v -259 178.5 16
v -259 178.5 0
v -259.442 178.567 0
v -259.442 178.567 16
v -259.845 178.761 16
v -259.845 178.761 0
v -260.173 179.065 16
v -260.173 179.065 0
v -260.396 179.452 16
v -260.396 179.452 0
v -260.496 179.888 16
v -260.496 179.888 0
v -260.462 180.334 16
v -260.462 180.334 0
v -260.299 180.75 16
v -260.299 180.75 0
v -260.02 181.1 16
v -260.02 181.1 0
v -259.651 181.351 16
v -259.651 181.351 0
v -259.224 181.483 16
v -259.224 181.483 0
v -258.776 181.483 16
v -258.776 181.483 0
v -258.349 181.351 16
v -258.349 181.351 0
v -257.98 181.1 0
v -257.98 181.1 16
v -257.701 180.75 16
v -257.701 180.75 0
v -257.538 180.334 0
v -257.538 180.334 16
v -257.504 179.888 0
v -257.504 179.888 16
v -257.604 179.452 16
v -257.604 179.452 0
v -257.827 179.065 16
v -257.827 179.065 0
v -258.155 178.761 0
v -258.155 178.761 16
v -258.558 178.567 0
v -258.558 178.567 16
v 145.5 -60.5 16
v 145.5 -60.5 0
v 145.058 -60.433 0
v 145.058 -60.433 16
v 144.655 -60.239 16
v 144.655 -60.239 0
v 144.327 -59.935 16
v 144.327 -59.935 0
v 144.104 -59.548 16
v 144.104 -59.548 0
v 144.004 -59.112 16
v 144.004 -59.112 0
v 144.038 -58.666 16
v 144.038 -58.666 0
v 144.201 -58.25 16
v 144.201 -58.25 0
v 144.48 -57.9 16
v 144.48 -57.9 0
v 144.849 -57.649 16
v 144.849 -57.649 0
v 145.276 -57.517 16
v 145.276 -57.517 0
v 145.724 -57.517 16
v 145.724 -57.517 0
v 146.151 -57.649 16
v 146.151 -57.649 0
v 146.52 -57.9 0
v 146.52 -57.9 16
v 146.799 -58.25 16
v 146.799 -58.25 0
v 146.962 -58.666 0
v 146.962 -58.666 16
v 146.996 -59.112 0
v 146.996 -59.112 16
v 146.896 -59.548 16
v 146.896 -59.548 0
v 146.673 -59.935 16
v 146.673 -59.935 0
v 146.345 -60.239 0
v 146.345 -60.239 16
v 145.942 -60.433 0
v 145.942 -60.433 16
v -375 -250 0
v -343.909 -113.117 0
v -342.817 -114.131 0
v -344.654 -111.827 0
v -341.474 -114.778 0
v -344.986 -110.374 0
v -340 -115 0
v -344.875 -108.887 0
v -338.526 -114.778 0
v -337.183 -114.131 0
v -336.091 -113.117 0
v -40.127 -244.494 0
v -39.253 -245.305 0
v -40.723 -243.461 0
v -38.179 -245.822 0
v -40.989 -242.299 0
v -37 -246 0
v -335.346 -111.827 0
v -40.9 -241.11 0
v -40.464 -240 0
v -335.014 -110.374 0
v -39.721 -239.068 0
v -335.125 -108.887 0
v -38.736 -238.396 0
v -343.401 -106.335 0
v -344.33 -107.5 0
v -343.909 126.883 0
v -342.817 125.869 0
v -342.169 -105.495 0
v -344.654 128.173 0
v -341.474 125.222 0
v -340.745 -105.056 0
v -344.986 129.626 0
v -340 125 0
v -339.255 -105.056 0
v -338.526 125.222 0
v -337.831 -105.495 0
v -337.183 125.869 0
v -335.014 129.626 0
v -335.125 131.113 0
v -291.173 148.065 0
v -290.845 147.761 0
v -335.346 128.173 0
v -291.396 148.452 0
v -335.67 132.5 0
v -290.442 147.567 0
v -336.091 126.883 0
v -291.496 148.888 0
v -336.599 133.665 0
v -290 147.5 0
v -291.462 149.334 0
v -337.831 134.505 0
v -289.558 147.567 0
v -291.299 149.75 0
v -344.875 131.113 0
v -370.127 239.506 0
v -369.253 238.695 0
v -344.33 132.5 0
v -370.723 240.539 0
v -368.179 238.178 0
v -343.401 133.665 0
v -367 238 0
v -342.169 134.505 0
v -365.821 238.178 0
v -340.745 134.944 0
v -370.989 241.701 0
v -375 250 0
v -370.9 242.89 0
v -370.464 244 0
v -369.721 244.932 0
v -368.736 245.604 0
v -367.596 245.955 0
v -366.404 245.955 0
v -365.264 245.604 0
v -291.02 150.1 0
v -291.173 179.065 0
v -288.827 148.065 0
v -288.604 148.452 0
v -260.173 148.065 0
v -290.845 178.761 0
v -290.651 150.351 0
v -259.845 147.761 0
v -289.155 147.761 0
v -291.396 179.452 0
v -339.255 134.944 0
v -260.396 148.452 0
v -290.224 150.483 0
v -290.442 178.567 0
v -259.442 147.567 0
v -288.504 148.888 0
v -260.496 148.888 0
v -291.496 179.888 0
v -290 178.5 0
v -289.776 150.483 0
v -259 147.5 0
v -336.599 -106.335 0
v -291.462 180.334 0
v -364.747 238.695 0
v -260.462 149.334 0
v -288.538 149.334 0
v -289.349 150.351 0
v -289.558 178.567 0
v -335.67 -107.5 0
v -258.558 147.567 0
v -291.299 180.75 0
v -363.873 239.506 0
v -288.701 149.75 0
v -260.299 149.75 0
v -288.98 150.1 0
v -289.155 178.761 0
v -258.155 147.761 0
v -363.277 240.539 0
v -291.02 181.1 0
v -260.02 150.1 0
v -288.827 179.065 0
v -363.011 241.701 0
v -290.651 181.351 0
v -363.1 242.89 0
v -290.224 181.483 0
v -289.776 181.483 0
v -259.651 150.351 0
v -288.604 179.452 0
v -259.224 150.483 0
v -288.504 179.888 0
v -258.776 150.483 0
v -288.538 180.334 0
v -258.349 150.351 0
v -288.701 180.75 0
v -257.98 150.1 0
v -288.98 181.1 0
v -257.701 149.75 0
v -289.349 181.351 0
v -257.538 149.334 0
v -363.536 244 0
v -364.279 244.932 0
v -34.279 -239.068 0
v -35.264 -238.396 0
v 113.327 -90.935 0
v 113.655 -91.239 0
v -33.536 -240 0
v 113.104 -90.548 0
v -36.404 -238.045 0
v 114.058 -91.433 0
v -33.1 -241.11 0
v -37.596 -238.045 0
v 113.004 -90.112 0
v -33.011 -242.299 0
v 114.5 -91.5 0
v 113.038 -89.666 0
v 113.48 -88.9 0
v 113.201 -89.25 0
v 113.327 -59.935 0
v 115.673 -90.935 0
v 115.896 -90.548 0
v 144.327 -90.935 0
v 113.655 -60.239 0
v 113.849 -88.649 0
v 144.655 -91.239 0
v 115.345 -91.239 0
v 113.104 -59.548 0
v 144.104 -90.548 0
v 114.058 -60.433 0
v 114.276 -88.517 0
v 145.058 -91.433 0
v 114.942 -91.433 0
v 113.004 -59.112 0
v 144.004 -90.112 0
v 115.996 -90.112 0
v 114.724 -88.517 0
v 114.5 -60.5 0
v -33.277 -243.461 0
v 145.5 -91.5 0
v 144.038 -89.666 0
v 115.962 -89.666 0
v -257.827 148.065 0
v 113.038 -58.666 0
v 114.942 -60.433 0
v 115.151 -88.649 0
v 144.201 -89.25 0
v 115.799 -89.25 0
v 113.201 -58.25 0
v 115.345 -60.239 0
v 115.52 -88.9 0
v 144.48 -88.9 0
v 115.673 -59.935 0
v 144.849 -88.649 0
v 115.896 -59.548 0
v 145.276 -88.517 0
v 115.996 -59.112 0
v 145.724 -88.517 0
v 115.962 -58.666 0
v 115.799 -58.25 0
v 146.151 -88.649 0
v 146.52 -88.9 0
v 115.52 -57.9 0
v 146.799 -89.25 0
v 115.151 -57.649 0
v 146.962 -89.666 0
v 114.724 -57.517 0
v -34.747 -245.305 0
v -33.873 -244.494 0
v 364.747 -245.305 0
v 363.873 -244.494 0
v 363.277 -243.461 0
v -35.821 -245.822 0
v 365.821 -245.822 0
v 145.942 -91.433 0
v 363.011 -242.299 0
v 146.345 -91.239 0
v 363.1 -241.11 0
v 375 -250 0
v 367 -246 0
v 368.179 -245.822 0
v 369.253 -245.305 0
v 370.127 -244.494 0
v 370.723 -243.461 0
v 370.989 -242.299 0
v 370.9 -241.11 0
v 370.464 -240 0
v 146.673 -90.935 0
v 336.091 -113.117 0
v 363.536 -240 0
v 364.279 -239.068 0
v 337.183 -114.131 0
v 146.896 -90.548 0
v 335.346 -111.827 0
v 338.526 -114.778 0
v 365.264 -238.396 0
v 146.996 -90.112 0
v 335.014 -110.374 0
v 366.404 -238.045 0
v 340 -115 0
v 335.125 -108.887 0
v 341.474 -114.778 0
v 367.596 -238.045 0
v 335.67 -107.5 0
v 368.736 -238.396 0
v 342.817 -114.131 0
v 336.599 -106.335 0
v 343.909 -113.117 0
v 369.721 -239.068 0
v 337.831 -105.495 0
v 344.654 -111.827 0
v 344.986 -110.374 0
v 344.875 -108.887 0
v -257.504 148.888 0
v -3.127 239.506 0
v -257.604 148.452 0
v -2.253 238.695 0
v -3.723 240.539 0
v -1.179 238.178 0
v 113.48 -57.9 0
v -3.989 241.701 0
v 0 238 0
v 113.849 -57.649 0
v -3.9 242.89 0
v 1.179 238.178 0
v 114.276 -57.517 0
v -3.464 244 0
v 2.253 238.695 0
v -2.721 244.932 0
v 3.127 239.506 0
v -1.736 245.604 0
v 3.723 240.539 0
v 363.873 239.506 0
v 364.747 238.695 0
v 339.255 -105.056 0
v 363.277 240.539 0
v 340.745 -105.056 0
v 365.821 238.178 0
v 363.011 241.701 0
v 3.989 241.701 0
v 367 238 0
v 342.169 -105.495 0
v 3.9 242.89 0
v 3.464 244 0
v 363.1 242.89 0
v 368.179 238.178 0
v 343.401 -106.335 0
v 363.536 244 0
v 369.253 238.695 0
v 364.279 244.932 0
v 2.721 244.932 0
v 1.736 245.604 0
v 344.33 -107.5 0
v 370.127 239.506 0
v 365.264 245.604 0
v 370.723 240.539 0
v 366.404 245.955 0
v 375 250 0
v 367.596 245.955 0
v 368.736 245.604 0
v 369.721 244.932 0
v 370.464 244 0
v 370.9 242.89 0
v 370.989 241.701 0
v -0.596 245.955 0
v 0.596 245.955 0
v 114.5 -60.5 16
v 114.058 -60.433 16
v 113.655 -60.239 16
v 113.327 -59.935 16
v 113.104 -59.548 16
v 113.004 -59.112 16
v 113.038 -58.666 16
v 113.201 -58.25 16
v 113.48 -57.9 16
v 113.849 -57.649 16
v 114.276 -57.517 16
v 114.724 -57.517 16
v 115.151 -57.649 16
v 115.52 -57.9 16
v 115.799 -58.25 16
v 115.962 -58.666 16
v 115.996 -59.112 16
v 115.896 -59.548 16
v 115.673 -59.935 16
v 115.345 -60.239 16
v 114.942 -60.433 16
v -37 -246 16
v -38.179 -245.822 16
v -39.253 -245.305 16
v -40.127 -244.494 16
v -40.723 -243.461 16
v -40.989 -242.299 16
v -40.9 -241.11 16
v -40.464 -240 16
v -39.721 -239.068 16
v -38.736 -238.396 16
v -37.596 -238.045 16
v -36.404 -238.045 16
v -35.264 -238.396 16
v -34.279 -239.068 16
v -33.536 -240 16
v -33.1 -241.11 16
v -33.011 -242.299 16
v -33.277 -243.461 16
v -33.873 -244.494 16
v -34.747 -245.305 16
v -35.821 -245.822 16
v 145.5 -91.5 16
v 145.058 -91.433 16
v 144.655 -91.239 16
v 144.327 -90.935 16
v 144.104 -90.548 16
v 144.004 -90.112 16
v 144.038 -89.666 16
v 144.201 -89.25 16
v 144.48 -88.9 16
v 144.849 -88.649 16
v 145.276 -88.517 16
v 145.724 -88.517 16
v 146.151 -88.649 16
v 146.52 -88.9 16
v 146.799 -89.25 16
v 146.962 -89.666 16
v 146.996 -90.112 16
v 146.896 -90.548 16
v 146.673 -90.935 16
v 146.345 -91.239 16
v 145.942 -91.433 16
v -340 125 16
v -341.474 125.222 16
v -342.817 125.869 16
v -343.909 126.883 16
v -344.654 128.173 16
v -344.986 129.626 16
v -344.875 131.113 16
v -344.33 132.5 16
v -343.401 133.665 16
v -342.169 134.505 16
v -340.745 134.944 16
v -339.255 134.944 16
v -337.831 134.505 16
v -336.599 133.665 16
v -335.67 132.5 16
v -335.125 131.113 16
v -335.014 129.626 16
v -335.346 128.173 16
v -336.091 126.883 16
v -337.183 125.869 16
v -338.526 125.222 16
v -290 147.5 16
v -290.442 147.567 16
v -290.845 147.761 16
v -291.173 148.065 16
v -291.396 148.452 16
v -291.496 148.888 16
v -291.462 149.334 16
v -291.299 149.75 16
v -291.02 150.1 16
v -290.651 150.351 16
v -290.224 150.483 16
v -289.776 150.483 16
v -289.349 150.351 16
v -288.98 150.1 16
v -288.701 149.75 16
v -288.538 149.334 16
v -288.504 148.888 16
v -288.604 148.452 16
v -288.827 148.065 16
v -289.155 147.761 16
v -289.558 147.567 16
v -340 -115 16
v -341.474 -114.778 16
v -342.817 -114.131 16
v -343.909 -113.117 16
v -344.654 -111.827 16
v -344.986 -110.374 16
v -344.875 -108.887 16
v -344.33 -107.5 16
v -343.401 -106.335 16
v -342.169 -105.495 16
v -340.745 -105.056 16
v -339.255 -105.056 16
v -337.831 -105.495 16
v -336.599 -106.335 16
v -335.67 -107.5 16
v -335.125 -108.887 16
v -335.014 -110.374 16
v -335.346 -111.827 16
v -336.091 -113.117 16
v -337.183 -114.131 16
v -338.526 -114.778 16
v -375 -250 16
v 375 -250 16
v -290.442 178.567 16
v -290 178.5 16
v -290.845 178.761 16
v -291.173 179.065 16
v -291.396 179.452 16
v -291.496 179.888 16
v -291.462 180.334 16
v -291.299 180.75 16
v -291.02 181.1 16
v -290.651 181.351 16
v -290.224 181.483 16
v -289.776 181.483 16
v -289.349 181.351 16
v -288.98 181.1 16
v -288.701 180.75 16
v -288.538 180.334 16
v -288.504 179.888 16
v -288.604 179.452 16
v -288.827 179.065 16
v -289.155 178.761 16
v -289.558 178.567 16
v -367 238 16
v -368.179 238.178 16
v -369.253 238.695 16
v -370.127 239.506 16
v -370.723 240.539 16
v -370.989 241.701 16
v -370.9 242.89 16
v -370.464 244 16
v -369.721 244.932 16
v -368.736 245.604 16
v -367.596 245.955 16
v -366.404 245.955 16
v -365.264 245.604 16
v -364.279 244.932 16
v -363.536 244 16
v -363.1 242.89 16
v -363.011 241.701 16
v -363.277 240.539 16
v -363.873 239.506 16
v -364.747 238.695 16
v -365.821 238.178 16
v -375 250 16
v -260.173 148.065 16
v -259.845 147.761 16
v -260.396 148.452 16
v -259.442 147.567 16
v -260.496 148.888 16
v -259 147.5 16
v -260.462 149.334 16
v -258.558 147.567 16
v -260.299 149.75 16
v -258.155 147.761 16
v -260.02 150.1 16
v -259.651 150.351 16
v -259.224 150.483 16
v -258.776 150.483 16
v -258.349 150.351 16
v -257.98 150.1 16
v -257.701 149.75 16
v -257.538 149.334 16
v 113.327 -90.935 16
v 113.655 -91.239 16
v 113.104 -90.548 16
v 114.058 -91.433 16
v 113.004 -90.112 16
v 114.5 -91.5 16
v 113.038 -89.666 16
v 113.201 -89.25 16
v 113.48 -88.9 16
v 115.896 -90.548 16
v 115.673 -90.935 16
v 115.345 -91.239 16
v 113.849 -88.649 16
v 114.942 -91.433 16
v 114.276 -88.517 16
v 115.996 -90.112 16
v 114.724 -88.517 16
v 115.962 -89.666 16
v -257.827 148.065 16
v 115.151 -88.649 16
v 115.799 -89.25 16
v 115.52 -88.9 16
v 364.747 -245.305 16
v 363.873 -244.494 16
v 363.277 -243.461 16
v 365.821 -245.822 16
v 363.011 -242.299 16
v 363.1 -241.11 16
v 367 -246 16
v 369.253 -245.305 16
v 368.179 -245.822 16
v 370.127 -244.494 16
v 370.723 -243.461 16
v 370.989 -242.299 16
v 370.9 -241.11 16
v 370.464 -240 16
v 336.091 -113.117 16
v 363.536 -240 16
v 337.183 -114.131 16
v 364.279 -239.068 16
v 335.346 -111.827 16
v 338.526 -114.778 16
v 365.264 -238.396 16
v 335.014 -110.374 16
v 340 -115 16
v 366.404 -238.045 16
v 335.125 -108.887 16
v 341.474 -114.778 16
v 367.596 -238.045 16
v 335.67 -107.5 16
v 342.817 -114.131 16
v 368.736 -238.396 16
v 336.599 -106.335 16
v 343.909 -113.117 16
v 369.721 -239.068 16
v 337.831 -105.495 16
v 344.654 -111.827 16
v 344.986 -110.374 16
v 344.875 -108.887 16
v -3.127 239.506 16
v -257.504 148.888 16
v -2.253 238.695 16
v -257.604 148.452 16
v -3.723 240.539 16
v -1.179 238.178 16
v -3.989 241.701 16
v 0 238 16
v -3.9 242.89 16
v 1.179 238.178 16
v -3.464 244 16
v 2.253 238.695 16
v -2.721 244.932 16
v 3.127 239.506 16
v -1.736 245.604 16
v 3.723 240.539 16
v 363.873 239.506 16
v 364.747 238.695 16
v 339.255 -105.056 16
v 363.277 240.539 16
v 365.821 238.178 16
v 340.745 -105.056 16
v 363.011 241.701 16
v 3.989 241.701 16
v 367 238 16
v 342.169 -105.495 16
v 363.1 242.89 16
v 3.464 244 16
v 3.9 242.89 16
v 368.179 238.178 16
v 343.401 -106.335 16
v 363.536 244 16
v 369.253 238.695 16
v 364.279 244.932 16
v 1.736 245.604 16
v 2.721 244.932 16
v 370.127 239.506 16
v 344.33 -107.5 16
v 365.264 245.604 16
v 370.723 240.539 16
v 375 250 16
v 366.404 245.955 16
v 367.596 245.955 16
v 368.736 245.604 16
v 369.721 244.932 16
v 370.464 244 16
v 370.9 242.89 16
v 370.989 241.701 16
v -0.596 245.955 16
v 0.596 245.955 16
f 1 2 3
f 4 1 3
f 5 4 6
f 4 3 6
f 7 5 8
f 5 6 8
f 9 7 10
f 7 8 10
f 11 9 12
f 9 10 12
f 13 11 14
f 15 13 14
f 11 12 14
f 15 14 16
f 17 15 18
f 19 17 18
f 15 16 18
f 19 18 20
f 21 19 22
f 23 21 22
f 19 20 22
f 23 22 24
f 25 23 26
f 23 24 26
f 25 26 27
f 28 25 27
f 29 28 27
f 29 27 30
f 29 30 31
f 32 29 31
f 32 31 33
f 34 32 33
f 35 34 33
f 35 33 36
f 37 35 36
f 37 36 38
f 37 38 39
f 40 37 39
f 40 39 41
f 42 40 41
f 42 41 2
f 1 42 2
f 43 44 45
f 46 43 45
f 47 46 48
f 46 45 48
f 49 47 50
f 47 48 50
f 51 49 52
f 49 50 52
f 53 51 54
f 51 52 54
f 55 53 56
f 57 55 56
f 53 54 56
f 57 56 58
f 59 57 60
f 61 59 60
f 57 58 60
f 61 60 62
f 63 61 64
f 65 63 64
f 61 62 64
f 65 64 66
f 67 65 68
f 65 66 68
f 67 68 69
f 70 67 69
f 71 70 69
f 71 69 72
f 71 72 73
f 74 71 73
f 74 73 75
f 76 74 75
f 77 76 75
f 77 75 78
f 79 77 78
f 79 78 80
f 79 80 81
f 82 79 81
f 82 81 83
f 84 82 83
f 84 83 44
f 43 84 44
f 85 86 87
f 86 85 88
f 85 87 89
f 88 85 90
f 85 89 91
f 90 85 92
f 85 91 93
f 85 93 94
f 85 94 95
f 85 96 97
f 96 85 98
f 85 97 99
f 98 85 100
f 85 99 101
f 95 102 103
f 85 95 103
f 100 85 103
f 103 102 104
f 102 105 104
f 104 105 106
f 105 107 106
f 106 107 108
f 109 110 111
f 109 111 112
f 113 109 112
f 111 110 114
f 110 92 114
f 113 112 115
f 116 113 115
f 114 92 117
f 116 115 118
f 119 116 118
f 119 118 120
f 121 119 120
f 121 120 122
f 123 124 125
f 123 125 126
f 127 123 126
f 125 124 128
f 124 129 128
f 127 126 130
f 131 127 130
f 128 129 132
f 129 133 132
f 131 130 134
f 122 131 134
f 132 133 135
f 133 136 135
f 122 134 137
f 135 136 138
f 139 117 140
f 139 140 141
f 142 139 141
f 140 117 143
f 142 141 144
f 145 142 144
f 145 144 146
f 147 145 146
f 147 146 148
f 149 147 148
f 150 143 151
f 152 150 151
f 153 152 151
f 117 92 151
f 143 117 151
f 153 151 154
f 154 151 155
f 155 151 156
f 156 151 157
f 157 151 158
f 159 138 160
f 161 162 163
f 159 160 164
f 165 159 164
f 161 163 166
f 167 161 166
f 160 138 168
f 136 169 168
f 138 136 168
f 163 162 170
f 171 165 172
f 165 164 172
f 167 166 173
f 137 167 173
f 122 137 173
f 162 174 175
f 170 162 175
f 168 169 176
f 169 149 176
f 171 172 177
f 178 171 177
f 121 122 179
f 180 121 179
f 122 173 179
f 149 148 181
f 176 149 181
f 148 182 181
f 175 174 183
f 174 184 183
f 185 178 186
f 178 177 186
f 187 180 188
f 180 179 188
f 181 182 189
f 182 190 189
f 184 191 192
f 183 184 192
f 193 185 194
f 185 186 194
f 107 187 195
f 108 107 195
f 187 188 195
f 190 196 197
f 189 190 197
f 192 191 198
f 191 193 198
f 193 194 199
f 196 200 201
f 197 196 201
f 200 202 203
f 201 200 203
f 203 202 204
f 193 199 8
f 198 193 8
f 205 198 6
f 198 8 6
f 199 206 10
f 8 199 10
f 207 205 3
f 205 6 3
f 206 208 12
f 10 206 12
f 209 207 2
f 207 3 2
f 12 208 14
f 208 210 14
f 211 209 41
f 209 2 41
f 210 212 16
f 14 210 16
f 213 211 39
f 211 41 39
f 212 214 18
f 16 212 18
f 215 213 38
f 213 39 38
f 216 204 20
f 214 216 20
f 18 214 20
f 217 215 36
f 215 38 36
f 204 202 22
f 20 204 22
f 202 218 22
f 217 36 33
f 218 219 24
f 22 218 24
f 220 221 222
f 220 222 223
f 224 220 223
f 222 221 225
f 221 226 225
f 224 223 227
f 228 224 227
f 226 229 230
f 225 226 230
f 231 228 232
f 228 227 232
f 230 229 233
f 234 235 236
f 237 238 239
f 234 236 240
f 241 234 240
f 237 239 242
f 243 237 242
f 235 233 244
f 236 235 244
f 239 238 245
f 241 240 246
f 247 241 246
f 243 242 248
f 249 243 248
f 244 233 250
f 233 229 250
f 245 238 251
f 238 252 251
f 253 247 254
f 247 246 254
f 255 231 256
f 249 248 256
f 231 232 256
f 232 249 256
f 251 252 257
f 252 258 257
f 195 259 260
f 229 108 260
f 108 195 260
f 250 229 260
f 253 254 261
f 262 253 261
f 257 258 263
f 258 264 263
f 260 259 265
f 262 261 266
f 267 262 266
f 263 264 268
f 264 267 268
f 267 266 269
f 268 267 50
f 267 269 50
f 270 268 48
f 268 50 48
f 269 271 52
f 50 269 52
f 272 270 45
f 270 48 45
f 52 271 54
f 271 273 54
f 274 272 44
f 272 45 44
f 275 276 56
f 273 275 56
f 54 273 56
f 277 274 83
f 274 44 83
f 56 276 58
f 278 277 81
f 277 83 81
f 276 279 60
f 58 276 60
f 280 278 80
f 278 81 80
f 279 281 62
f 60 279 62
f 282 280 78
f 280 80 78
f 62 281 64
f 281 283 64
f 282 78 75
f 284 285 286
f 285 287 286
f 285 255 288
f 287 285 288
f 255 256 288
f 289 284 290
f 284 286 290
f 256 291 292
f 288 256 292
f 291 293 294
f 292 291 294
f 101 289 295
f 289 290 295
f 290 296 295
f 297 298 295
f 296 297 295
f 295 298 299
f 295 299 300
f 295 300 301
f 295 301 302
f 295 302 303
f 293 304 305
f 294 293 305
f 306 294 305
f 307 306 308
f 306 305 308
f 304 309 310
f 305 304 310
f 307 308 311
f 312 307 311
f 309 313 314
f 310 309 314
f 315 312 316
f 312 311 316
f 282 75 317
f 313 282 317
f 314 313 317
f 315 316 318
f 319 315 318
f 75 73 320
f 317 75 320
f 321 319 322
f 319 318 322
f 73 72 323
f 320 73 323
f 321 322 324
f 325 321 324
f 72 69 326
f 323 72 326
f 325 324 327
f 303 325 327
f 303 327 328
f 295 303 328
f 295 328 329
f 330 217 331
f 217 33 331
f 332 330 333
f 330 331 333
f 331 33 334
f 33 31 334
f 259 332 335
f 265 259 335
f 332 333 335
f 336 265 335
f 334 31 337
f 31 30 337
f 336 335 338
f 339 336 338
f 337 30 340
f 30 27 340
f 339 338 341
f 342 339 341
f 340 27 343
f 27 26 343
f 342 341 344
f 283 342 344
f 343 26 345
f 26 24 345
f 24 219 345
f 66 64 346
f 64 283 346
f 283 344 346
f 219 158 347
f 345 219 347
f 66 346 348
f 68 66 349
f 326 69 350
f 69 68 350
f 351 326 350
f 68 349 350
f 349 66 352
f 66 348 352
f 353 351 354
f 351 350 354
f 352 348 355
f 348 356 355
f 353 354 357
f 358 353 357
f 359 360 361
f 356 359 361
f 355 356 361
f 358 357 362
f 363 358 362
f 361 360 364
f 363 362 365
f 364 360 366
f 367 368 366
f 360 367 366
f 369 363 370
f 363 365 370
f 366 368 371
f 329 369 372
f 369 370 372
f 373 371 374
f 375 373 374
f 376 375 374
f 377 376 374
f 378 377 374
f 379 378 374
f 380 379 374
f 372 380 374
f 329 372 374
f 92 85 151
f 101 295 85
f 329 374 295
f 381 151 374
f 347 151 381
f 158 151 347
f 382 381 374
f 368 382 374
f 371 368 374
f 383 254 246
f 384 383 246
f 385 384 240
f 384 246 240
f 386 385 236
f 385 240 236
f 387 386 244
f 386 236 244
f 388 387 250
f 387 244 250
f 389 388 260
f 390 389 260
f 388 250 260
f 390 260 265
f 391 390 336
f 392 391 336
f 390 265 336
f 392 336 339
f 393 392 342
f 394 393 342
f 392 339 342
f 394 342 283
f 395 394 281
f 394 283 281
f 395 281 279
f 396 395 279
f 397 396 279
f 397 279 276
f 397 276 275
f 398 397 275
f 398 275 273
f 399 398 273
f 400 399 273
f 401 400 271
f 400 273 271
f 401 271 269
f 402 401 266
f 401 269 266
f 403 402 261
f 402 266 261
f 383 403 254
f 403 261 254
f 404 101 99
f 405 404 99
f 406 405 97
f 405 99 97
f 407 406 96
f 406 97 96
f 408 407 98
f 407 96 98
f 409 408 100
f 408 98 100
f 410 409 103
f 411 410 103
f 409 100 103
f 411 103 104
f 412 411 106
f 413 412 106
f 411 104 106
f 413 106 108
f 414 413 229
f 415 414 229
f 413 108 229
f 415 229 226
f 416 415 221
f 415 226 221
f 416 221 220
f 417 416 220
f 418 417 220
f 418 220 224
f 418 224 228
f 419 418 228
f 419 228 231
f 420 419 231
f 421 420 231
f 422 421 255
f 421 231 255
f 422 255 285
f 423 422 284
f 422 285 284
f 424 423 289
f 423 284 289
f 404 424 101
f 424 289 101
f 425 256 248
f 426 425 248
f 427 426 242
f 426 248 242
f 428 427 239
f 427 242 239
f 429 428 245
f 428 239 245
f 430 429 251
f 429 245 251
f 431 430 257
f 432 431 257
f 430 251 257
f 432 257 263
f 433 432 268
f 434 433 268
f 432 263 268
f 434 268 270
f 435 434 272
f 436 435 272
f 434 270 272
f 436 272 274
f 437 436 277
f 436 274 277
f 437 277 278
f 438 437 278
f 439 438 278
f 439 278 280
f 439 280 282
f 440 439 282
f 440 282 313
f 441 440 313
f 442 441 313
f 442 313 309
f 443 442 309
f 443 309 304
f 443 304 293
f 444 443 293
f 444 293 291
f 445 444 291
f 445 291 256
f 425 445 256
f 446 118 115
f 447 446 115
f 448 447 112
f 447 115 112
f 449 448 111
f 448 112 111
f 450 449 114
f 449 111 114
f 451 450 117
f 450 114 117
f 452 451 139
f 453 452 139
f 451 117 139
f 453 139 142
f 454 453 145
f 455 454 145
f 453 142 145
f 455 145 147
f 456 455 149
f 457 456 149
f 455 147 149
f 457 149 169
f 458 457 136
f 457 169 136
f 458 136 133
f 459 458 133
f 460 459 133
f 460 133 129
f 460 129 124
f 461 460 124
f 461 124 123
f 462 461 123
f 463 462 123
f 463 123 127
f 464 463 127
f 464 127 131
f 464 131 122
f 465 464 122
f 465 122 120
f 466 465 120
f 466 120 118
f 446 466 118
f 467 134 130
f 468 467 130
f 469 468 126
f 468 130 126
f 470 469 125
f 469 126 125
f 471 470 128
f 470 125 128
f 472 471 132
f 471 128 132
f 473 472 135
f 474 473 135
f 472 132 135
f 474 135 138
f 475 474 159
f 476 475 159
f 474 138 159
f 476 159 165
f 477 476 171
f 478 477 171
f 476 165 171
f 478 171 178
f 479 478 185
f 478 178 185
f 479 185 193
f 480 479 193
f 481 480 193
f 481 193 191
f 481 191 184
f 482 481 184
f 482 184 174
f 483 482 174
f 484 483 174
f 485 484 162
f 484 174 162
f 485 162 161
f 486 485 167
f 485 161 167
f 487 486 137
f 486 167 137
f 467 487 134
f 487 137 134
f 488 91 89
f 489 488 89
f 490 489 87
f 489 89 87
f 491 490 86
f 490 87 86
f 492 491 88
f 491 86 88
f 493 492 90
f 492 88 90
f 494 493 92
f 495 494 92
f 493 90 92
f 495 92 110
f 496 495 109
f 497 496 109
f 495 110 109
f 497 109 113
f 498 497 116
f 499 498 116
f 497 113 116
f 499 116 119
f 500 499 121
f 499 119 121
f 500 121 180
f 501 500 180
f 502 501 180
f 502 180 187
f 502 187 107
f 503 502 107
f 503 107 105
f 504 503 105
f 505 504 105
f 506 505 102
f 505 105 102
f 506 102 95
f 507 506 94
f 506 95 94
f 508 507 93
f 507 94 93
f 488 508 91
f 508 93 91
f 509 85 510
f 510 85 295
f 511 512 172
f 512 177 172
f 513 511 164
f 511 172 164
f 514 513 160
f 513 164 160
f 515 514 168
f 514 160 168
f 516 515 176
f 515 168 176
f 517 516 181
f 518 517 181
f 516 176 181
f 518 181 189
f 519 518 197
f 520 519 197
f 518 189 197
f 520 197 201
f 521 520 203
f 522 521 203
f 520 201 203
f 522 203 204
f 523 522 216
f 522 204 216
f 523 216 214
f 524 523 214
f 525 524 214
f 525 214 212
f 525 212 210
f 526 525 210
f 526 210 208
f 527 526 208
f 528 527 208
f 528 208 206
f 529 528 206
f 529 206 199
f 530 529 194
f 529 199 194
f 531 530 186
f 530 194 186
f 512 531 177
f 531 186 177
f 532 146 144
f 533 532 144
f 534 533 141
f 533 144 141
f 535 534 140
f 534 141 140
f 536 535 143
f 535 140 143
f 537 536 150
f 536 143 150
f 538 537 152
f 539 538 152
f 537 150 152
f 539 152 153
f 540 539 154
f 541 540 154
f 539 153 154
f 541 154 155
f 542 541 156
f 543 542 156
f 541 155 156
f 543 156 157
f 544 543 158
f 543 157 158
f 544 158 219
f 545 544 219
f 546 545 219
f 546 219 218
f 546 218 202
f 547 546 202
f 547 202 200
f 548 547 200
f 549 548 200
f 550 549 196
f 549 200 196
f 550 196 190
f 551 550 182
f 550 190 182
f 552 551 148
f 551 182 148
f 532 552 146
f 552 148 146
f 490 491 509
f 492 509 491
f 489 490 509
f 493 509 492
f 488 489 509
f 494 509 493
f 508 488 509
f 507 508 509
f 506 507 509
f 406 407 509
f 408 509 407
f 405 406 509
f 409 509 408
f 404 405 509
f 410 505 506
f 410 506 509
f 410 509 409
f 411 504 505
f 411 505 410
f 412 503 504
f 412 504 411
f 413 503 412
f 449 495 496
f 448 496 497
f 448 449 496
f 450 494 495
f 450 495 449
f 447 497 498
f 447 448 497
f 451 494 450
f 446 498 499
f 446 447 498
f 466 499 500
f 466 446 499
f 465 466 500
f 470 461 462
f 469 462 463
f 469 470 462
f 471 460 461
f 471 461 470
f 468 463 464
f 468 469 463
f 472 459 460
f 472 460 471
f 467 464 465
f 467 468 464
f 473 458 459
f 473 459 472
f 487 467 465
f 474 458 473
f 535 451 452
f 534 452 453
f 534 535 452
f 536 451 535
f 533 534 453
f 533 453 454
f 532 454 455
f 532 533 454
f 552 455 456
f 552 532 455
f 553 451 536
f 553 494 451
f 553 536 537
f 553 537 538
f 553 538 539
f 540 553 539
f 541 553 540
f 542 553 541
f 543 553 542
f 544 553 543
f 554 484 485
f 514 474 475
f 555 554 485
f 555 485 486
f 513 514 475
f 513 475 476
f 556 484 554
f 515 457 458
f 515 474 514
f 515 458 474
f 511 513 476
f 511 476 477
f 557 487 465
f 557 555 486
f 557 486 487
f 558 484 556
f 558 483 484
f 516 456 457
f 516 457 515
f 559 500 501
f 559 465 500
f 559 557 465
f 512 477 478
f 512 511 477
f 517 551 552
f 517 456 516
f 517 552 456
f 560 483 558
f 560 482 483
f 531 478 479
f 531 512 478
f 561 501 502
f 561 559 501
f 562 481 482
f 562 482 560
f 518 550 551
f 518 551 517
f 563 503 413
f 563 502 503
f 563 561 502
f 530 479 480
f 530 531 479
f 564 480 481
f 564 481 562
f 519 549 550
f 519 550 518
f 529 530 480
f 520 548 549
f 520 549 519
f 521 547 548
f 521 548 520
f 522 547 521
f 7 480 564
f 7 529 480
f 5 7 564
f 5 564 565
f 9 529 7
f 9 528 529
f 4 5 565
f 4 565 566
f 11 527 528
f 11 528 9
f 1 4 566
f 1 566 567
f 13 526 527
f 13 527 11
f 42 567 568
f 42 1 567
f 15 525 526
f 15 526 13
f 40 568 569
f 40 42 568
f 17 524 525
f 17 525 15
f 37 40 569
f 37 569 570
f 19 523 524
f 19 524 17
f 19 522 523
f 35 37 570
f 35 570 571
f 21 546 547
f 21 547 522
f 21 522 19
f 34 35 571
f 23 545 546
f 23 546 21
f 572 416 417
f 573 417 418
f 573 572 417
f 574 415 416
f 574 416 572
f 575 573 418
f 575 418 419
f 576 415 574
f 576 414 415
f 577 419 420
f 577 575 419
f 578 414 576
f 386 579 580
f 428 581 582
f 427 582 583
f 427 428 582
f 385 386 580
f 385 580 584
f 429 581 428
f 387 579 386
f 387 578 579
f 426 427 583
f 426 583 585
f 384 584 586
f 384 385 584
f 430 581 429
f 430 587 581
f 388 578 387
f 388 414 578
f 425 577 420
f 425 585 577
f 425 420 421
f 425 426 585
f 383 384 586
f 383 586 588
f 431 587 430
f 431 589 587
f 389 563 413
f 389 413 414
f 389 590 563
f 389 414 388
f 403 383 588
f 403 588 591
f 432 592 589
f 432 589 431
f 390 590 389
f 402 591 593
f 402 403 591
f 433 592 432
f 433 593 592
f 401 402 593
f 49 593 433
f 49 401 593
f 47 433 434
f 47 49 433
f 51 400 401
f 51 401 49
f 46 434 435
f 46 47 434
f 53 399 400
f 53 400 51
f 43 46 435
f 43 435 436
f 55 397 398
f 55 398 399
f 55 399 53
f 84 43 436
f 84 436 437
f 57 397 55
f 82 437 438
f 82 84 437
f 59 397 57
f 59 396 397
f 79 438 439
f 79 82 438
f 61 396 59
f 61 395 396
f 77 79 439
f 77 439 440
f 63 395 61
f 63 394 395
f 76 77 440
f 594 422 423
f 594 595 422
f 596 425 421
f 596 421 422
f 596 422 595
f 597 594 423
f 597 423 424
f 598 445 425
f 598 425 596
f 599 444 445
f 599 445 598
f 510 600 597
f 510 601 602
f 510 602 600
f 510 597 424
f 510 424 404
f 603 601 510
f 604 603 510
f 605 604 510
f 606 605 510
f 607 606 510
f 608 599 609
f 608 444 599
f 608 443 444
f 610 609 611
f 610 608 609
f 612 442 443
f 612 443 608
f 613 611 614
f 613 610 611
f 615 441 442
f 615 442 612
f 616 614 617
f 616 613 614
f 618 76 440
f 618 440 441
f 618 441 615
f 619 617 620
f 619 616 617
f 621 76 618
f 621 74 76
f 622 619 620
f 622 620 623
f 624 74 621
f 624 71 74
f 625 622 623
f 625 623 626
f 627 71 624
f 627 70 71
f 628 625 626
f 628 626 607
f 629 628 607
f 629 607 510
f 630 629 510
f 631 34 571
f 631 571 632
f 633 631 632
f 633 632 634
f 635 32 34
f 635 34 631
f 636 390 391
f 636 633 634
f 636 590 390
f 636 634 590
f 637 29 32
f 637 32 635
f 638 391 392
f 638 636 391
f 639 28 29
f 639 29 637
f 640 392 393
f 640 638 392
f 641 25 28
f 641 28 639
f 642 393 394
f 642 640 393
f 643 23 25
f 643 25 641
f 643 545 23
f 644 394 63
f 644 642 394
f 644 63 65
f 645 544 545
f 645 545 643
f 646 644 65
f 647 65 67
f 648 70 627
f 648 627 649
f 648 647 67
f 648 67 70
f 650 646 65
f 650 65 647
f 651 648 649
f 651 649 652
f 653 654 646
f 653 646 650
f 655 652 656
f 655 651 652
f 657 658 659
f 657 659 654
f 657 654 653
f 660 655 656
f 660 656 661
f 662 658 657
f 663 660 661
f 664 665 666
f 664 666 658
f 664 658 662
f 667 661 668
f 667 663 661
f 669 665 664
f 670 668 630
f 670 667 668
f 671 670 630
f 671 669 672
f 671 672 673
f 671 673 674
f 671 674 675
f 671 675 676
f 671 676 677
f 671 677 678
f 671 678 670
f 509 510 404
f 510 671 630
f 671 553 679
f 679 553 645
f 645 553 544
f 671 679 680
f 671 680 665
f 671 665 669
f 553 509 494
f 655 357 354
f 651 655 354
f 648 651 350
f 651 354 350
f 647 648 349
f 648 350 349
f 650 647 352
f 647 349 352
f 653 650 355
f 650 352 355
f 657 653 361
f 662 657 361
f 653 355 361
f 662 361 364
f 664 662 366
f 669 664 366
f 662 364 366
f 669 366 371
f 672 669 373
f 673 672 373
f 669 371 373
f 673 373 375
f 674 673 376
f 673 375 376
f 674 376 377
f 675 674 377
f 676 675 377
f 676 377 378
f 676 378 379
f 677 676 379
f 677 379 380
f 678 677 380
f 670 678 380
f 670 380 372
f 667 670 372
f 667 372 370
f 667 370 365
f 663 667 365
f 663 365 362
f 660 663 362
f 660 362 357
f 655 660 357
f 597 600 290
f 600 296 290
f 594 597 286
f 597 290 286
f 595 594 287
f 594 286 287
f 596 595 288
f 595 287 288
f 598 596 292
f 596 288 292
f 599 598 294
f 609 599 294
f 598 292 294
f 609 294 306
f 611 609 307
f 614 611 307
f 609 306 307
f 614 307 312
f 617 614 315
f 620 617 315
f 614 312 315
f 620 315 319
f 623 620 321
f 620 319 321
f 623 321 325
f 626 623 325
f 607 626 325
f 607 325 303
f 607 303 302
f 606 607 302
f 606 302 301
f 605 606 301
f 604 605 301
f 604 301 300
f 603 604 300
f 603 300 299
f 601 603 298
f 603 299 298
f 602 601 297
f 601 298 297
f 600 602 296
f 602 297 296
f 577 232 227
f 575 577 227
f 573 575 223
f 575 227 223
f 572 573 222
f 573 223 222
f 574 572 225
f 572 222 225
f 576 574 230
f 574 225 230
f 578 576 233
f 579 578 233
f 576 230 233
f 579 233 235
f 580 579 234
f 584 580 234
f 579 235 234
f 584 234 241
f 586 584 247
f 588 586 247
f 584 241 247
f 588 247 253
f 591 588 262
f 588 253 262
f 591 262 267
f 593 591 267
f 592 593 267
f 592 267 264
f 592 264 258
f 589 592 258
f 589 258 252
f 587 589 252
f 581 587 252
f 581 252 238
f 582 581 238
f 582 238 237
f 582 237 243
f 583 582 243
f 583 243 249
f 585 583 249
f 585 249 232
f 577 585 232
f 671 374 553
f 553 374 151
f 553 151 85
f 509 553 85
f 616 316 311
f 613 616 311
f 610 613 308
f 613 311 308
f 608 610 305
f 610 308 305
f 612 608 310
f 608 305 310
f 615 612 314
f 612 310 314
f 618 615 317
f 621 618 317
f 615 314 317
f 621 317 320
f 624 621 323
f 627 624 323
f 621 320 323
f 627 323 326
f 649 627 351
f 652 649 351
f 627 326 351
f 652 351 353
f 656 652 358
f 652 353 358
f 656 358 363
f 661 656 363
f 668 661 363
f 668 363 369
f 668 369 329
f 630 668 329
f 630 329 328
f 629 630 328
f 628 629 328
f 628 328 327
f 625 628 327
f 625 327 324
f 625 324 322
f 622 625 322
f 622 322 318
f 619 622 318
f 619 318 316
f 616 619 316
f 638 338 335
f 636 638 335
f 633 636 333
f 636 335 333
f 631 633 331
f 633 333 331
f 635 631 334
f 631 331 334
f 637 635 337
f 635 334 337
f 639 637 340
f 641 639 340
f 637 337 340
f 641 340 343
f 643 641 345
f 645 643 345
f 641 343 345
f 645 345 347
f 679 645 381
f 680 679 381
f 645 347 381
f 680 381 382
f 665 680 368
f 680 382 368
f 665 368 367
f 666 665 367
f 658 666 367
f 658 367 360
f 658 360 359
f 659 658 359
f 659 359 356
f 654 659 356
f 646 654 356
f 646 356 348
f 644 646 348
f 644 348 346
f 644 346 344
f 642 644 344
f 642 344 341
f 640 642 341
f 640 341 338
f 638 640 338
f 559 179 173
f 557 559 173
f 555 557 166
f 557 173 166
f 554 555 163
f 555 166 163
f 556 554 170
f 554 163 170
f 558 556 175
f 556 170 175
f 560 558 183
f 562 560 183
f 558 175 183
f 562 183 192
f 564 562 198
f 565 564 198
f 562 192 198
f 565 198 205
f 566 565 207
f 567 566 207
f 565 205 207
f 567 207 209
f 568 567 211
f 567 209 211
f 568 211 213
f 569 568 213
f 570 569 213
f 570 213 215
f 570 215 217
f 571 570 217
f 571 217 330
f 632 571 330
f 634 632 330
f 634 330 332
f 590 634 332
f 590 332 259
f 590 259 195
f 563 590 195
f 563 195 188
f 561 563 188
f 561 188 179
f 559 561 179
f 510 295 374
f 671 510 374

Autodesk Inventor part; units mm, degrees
ref_plane "YZ Plane" through (0, 0, 0) normal (1, 0, 0) x (0, 1, 0)
ref_plane "XZ Plane" through (0, 0, 0) normal (0, 1, 0) x (-1, 0, 0)
ref_plane "XY Plane" through (0, 0, 0) normal (0, 0, 1) x (1, 0, 0)
sketch "Skizze1" plane through (0, 0, 0) normal (0, 0, 1) x (1, 0, 0)
  line L0 (-375, -250) -> (375, -250)
  line L1 (375, -250) -> (375, 250)
  line L2 (375, 250) -> (-375, 250)
  line L3 (-375, 250) -> (-375, -250)
  line L4 (-375, -250) -> (375, 250) construction
  line L5 (375, -250) -> (-375, 250) construction
  point P0 (0, 0)
  dimension "d0" = 750
  dimension "d1" = 500
extrude "Extrusion1" add sketch "Skizze1" along normal blind 16
sketch "Skizze5" plane through (0, 0, 16) normal (0, 0, 1) x (1, 0, 0)
  line L0 (375, -250) -> (375, 250) projected
  line L1 (375, 250) -> (-375, 250) projected
  line L2 (-375, 250) -> (-375, -250) projected
  line L3 (-375, -250) -> (375, -250) projected
  point P0 (0, 0)
  point P1 (340, -110)
  point P2 (-340, -110)
  point P3 (-340, 130)
  dimension "d39" = 140
  dimension "d40" = 140
  dimension "d41" = 35
  dimension "d42" = 35
  dimension "d44" = 120
  dimension "d57" = 35
hole "Bohrung4" at (340, -110, 16) at (-340, -110, 16) at (-340, 130, 16) direction (0, 0, -1) diameter 10 end through all
sketch "Skizze6" plane through (0, 0, 16) normal (0, 0, 1) x (1, 0, 0)
  circle A0 centre (-340, 130) radius 5 projected
  point P0 (0, 0)
  point P1 (-290, 149)
  point P2 (-259, 149)
  point P3 (-259, 180)
  point P4 (-290, 180)
  dimension "d59" = 31
  dimension "d60" = 31
  dimension "d65" = 50
  dimension "d66" = 50
hole "Bohrung5" at (-290, 149, 16) at (-259, 149, 16) at (-259, 180, 16) at (-290, 180, 16) direction (0, 0, -1) diameter 3 end through all
sketch "Skizze8" plane through (0, 0, 16) normal (0, 0, 1) x (1, 0, 0)
  line L0 (375, -250) -> (375, 250) projected
  line L1 (-375, -250) -> (375, -250) projected
  point P0 (0, 0)
  point P1 (114.5, -59)
  point P2 (145.5, -59)
  point P3 (114.5, -90)
  point P4 (145.5, -90)
  dimension "d85" = 31
  dimension "d86" = 31
  dimension "d87" = 160
  dimension "d88" = 229.5
hole "Bohrung7" at (114.5, -59, 16) at (145.5, -59, 16) at (114.5, -90, 16) at (145.5, -90, 16) direction (0, 0, -1) diameter 3 end through all
sketch "Skizze9" plane through (0, 0, 16) normal (0, 0, 1) x (1, 0, 0)
  line L0 (375, -250) -> (375, 250) projected
  line L1 (375, 250) -> (-375, 250) projected
  line L2 (-375, 250) -> (-375, -250) projected
  line L3 (-375, -250) -> (375, -250) projected
  point P0 (0, 0)
  point P1 (-367, 242)
  point P2 (0, 242)
  point P3 (367, 242)
  point P4 (367, -242)
  point P5 (-37, -242)
  dimension "d96" = 8
  dimension "d97" = 8
  dimension "d98" = 8
  dimension "d99" = 8
  dimension "d107" = 338
hole "Bohrung8" at (-367, 242, 16) at (0, 242, 16) at (367, 242, 16) at (367, -242, 16) at (-37, -242, 16) direction (0, 0, -1) diameter 8 depth 20 tip angle 118
equation "\"d98\" = d97"
equation "\"d99\" = d96"
properties part number "Seite" material "Holz (Birke)"
